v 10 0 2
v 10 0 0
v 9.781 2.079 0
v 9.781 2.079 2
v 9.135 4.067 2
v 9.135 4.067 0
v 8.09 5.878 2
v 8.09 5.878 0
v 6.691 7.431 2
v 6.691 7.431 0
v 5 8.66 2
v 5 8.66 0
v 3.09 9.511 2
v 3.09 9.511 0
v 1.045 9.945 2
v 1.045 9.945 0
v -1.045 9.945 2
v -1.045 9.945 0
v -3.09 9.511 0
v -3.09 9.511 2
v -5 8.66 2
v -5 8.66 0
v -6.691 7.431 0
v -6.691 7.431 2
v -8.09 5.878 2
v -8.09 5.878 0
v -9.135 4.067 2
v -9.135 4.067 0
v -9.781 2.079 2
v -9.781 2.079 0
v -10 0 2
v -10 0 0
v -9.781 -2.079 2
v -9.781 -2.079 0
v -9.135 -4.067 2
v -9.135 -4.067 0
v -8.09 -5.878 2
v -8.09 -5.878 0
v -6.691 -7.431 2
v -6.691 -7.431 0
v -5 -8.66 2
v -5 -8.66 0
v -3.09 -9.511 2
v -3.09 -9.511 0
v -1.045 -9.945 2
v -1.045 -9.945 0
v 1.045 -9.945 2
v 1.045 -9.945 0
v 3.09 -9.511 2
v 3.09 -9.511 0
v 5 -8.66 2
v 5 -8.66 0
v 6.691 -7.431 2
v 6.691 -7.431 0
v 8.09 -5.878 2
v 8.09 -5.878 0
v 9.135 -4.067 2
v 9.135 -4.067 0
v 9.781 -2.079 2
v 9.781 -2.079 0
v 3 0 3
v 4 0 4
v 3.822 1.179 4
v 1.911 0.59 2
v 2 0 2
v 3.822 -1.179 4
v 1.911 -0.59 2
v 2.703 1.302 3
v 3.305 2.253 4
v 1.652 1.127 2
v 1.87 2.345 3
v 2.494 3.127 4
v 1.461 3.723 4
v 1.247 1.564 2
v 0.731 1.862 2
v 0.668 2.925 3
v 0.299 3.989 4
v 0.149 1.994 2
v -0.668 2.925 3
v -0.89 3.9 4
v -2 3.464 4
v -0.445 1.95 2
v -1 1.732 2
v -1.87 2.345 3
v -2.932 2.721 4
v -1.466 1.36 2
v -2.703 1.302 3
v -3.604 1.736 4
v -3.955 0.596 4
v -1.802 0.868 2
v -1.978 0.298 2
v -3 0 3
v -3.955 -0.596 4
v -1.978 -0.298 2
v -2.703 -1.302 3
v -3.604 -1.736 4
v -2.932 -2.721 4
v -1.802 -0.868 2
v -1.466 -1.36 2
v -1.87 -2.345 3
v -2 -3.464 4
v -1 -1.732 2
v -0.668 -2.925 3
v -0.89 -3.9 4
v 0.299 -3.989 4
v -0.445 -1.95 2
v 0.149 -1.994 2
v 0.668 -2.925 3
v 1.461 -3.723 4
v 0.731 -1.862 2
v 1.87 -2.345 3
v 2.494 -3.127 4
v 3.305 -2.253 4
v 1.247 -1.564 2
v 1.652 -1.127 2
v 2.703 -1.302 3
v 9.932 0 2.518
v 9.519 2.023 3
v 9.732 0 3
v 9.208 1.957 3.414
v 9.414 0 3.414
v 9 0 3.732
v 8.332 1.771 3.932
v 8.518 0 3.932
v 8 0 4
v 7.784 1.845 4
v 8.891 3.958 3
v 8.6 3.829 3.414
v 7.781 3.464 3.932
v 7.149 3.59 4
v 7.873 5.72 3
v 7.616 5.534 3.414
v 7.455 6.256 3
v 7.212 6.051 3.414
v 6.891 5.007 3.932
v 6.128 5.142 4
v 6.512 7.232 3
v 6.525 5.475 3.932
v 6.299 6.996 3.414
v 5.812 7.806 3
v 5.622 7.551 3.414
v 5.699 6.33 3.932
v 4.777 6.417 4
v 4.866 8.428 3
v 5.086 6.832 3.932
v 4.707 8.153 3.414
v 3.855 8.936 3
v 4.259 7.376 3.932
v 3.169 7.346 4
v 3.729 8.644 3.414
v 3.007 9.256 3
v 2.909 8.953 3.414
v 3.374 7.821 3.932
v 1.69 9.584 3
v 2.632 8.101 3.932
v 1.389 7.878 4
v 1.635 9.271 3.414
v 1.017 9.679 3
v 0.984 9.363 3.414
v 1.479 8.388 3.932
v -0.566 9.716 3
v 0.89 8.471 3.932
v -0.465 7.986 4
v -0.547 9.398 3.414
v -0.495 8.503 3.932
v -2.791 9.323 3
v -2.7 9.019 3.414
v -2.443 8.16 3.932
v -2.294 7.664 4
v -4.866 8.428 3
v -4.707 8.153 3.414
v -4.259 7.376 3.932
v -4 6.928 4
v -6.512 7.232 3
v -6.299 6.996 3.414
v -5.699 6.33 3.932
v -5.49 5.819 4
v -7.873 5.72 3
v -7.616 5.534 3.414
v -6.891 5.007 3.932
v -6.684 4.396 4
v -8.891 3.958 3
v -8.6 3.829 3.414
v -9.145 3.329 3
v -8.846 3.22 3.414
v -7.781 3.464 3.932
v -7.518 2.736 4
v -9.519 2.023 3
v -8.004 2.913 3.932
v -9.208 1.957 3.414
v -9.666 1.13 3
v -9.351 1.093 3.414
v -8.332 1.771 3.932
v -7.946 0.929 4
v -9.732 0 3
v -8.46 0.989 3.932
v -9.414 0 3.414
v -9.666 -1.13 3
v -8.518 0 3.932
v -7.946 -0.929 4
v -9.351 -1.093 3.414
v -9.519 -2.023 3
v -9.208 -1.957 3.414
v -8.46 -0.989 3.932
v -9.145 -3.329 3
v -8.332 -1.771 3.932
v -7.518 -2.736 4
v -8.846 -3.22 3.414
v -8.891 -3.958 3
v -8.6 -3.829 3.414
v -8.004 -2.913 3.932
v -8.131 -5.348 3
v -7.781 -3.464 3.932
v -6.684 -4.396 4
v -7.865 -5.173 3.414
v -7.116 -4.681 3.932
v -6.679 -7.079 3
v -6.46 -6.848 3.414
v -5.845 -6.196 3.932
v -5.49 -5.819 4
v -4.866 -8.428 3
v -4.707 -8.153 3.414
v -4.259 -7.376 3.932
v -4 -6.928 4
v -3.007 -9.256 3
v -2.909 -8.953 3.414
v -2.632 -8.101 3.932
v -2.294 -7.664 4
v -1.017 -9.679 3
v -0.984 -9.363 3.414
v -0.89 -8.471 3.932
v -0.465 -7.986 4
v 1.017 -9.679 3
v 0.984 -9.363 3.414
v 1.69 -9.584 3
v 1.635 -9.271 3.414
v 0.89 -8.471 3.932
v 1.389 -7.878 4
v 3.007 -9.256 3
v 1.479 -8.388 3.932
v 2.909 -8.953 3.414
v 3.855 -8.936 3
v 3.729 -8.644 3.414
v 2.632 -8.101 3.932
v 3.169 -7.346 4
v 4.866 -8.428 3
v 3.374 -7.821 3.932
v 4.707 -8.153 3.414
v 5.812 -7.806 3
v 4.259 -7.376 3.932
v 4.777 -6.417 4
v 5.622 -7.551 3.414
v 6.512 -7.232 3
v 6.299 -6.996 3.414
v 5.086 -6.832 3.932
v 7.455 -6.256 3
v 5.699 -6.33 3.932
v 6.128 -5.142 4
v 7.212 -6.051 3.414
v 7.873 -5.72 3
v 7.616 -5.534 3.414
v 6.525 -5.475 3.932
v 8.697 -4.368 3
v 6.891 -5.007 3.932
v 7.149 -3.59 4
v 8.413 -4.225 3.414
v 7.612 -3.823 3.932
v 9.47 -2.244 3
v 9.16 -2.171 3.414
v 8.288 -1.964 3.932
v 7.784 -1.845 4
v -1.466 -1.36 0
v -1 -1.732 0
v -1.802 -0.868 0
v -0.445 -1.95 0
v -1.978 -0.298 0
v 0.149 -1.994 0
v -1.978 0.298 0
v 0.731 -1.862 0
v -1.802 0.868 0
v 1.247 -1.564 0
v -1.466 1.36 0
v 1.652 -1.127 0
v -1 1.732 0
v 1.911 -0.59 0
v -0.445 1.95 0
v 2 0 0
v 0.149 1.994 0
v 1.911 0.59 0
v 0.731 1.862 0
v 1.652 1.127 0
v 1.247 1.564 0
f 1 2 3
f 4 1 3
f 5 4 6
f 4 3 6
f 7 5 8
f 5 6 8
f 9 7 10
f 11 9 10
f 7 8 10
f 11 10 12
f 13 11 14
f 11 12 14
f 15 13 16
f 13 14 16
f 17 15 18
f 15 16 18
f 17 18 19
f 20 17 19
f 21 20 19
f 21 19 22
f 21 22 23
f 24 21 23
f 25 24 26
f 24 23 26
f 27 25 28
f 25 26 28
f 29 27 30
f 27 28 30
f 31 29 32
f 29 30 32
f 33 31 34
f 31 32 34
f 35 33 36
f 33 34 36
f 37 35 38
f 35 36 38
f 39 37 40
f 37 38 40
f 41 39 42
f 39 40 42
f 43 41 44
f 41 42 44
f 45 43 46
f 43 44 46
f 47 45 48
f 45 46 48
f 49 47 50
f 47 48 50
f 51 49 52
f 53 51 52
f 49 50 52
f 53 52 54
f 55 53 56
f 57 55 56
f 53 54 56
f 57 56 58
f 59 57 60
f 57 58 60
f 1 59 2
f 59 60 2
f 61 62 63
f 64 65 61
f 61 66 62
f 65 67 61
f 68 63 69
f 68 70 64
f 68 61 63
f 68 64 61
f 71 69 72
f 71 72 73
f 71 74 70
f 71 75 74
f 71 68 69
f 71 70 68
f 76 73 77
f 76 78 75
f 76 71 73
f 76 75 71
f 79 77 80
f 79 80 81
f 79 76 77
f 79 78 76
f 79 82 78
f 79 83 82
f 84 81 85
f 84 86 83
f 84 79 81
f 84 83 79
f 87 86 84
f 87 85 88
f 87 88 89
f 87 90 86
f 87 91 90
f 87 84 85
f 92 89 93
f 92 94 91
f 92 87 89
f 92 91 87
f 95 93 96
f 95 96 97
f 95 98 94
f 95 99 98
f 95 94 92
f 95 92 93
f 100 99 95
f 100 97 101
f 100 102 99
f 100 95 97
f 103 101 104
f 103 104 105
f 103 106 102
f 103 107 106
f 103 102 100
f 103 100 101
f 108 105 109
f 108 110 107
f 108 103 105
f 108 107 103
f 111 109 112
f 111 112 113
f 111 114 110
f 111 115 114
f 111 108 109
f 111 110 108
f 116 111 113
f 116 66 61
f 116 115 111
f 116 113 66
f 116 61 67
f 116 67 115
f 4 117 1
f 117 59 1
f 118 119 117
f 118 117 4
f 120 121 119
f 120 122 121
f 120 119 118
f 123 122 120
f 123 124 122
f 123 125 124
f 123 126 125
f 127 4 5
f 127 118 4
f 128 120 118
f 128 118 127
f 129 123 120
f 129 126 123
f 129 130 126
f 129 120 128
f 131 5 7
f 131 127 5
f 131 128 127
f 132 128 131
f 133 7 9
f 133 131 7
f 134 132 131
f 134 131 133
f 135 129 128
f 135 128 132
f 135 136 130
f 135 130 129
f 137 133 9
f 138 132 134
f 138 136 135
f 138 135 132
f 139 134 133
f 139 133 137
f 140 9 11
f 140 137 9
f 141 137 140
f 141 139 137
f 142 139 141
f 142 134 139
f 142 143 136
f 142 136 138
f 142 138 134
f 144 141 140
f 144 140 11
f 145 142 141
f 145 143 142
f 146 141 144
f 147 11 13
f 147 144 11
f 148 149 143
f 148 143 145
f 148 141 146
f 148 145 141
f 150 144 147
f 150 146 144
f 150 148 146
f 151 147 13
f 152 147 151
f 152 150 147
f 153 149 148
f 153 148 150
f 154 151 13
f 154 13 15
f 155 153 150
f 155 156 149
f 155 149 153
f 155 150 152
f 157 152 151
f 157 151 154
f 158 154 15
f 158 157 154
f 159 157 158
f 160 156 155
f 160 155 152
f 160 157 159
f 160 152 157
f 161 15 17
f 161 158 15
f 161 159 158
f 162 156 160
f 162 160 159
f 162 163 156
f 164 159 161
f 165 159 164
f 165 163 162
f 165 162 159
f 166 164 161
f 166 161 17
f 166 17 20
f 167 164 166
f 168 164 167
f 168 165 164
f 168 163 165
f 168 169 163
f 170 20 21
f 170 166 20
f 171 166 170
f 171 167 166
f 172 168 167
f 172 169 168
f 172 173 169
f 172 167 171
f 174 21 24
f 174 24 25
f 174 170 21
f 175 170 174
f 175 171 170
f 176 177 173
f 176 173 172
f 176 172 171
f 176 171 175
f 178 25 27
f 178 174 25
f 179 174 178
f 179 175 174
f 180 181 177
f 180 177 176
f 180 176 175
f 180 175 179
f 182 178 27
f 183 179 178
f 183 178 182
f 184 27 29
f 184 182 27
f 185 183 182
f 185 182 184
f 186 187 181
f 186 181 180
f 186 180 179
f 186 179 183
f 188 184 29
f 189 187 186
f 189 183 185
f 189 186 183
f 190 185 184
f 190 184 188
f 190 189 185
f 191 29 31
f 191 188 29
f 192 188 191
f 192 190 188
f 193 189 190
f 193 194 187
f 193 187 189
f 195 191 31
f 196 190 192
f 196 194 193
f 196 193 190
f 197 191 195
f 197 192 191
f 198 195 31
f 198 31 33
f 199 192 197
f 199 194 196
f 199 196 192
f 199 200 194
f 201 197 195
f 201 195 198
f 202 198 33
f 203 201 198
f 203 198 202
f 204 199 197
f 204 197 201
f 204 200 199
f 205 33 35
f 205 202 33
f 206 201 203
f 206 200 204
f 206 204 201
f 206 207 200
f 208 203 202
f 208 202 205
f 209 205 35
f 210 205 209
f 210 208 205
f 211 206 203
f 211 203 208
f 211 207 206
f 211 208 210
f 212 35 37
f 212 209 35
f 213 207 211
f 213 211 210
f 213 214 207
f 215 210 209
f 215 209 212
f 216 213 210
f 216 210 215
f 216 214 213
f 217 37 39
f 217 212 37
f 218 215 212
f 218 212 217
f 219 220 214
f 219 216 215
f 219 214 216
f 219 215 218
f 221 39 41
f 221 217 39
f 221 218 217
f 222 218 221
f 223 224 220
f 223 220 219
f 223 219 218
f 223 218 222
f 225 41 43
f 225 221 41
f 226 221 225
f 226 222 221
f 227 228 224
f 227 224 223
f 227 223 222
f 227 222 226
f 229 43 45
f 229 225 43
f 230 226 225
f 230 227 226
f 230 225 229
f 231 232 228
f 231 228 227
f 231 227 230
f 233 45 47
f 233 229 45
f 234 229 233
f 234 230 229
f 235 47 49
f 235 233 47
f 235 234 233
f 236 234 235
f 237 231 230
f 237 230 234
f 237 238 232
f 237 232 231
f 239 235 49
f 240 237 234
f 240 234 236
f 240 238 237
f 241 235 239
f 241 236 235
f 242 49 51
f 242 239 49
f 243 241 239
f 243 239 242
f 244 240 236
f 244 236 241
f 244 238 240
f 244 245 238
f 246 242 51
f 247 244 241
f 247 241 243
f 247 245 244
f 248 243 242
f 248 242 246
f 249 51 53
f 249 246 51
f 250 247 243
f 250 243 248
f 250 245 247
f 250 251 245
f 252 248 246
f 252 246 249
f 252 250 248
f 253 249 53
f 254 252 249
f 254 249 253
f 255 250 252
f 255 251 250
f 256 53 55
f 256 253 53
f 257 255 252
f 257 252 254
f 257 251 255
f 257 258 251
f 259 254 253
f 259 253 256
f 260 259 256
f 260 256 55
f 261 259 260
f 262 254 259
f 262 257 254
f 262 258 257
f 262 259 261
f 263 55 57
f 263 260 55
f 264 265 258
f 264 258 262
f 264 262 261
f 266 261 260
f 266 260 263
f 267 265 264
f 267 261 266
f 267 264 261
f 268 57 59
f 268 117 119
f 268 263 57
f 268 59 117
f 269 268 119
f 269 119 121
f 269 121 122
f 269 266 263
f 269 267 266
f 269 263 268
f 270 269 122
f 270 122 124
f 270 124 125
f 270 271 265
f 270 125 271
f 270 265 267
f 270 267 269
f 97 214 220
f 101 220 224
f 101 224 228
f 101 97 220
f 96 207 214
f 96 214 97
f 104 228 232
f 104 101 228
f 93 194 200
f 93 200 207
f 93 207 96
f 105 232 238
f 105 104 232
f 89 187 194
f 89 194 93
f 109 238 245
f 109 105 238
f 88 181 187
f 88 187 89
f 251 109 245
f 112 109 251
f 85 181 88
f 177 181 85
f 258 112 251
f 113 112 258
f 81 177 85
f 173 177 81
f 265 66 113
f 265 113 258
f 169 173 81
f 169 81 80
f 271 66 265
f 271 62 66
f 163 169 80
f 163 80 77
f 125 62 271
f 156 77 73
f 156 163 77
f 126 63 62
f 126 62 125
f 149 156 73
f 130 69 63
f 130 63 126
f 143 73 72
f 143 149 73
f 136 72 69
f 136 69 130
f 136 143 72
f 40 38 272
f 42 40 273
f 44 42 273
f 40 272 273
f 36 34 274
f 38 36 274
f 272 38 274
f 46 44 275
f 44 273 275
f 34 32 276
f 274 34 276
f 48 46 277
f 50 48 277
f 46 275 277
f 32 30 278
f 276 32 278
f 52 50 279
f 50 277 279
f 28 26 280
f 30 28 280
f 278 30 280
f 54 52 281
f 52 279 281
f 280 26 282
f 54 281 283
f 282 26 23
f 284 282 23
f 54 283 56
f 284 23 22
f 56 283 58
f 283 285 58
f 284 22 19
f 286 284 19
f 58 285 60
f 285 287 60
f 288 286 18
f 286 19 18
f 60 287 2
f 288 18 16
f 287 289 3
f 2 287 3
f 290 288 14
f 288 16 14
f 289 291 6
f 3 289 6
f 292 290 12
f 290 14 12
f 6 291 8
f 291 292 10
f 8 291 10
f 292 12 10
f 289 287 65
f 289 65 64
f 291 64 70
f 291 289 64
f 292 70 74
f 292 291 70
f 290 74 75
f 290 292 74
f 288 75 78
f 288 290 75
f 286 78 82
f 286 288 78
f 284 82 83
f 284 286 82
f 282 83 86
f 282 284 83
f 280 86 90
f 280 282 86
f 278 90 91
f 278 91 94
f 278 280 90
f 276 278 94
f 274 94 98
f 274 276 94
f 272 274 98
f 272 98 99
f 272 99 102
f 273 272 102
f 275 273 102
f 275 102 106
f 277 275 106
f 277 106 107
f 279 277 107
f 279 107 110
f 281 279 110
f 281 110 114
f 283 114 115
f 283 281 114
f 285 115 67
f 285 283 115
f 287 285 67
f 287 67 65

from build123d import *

# Parameters (mm, degrees)
F0_R     = 10
F0_R_2   = 2
F1_DEPTH = 4
F2_R     = 2
F3_SIZE  = 2


with BuildPart() as f1:
    # F0 (on Top) → F1 (new body)
    with BuildSketch(Plane.XY):
        Circle(F0_R)
        Circle(F0_R_2, mode=Mode.SUBTRACT)
    extrude(amount=F1_DEPTH)

    # F2
    f2_edges = [f1.edges().sort_by_distance(p)[0] for p in [
        (-10, 0, 4),
    ]]
    fillet(f2_edges, radius=F2_R)

    # F3
    f3_edges = [f1.edges().sort_by_distance(p)[0] for p in [
        (-2, 0, 4),
    ]]
    chamfer(f3_edges, length=F3_SIZE)


solid = f1.part
